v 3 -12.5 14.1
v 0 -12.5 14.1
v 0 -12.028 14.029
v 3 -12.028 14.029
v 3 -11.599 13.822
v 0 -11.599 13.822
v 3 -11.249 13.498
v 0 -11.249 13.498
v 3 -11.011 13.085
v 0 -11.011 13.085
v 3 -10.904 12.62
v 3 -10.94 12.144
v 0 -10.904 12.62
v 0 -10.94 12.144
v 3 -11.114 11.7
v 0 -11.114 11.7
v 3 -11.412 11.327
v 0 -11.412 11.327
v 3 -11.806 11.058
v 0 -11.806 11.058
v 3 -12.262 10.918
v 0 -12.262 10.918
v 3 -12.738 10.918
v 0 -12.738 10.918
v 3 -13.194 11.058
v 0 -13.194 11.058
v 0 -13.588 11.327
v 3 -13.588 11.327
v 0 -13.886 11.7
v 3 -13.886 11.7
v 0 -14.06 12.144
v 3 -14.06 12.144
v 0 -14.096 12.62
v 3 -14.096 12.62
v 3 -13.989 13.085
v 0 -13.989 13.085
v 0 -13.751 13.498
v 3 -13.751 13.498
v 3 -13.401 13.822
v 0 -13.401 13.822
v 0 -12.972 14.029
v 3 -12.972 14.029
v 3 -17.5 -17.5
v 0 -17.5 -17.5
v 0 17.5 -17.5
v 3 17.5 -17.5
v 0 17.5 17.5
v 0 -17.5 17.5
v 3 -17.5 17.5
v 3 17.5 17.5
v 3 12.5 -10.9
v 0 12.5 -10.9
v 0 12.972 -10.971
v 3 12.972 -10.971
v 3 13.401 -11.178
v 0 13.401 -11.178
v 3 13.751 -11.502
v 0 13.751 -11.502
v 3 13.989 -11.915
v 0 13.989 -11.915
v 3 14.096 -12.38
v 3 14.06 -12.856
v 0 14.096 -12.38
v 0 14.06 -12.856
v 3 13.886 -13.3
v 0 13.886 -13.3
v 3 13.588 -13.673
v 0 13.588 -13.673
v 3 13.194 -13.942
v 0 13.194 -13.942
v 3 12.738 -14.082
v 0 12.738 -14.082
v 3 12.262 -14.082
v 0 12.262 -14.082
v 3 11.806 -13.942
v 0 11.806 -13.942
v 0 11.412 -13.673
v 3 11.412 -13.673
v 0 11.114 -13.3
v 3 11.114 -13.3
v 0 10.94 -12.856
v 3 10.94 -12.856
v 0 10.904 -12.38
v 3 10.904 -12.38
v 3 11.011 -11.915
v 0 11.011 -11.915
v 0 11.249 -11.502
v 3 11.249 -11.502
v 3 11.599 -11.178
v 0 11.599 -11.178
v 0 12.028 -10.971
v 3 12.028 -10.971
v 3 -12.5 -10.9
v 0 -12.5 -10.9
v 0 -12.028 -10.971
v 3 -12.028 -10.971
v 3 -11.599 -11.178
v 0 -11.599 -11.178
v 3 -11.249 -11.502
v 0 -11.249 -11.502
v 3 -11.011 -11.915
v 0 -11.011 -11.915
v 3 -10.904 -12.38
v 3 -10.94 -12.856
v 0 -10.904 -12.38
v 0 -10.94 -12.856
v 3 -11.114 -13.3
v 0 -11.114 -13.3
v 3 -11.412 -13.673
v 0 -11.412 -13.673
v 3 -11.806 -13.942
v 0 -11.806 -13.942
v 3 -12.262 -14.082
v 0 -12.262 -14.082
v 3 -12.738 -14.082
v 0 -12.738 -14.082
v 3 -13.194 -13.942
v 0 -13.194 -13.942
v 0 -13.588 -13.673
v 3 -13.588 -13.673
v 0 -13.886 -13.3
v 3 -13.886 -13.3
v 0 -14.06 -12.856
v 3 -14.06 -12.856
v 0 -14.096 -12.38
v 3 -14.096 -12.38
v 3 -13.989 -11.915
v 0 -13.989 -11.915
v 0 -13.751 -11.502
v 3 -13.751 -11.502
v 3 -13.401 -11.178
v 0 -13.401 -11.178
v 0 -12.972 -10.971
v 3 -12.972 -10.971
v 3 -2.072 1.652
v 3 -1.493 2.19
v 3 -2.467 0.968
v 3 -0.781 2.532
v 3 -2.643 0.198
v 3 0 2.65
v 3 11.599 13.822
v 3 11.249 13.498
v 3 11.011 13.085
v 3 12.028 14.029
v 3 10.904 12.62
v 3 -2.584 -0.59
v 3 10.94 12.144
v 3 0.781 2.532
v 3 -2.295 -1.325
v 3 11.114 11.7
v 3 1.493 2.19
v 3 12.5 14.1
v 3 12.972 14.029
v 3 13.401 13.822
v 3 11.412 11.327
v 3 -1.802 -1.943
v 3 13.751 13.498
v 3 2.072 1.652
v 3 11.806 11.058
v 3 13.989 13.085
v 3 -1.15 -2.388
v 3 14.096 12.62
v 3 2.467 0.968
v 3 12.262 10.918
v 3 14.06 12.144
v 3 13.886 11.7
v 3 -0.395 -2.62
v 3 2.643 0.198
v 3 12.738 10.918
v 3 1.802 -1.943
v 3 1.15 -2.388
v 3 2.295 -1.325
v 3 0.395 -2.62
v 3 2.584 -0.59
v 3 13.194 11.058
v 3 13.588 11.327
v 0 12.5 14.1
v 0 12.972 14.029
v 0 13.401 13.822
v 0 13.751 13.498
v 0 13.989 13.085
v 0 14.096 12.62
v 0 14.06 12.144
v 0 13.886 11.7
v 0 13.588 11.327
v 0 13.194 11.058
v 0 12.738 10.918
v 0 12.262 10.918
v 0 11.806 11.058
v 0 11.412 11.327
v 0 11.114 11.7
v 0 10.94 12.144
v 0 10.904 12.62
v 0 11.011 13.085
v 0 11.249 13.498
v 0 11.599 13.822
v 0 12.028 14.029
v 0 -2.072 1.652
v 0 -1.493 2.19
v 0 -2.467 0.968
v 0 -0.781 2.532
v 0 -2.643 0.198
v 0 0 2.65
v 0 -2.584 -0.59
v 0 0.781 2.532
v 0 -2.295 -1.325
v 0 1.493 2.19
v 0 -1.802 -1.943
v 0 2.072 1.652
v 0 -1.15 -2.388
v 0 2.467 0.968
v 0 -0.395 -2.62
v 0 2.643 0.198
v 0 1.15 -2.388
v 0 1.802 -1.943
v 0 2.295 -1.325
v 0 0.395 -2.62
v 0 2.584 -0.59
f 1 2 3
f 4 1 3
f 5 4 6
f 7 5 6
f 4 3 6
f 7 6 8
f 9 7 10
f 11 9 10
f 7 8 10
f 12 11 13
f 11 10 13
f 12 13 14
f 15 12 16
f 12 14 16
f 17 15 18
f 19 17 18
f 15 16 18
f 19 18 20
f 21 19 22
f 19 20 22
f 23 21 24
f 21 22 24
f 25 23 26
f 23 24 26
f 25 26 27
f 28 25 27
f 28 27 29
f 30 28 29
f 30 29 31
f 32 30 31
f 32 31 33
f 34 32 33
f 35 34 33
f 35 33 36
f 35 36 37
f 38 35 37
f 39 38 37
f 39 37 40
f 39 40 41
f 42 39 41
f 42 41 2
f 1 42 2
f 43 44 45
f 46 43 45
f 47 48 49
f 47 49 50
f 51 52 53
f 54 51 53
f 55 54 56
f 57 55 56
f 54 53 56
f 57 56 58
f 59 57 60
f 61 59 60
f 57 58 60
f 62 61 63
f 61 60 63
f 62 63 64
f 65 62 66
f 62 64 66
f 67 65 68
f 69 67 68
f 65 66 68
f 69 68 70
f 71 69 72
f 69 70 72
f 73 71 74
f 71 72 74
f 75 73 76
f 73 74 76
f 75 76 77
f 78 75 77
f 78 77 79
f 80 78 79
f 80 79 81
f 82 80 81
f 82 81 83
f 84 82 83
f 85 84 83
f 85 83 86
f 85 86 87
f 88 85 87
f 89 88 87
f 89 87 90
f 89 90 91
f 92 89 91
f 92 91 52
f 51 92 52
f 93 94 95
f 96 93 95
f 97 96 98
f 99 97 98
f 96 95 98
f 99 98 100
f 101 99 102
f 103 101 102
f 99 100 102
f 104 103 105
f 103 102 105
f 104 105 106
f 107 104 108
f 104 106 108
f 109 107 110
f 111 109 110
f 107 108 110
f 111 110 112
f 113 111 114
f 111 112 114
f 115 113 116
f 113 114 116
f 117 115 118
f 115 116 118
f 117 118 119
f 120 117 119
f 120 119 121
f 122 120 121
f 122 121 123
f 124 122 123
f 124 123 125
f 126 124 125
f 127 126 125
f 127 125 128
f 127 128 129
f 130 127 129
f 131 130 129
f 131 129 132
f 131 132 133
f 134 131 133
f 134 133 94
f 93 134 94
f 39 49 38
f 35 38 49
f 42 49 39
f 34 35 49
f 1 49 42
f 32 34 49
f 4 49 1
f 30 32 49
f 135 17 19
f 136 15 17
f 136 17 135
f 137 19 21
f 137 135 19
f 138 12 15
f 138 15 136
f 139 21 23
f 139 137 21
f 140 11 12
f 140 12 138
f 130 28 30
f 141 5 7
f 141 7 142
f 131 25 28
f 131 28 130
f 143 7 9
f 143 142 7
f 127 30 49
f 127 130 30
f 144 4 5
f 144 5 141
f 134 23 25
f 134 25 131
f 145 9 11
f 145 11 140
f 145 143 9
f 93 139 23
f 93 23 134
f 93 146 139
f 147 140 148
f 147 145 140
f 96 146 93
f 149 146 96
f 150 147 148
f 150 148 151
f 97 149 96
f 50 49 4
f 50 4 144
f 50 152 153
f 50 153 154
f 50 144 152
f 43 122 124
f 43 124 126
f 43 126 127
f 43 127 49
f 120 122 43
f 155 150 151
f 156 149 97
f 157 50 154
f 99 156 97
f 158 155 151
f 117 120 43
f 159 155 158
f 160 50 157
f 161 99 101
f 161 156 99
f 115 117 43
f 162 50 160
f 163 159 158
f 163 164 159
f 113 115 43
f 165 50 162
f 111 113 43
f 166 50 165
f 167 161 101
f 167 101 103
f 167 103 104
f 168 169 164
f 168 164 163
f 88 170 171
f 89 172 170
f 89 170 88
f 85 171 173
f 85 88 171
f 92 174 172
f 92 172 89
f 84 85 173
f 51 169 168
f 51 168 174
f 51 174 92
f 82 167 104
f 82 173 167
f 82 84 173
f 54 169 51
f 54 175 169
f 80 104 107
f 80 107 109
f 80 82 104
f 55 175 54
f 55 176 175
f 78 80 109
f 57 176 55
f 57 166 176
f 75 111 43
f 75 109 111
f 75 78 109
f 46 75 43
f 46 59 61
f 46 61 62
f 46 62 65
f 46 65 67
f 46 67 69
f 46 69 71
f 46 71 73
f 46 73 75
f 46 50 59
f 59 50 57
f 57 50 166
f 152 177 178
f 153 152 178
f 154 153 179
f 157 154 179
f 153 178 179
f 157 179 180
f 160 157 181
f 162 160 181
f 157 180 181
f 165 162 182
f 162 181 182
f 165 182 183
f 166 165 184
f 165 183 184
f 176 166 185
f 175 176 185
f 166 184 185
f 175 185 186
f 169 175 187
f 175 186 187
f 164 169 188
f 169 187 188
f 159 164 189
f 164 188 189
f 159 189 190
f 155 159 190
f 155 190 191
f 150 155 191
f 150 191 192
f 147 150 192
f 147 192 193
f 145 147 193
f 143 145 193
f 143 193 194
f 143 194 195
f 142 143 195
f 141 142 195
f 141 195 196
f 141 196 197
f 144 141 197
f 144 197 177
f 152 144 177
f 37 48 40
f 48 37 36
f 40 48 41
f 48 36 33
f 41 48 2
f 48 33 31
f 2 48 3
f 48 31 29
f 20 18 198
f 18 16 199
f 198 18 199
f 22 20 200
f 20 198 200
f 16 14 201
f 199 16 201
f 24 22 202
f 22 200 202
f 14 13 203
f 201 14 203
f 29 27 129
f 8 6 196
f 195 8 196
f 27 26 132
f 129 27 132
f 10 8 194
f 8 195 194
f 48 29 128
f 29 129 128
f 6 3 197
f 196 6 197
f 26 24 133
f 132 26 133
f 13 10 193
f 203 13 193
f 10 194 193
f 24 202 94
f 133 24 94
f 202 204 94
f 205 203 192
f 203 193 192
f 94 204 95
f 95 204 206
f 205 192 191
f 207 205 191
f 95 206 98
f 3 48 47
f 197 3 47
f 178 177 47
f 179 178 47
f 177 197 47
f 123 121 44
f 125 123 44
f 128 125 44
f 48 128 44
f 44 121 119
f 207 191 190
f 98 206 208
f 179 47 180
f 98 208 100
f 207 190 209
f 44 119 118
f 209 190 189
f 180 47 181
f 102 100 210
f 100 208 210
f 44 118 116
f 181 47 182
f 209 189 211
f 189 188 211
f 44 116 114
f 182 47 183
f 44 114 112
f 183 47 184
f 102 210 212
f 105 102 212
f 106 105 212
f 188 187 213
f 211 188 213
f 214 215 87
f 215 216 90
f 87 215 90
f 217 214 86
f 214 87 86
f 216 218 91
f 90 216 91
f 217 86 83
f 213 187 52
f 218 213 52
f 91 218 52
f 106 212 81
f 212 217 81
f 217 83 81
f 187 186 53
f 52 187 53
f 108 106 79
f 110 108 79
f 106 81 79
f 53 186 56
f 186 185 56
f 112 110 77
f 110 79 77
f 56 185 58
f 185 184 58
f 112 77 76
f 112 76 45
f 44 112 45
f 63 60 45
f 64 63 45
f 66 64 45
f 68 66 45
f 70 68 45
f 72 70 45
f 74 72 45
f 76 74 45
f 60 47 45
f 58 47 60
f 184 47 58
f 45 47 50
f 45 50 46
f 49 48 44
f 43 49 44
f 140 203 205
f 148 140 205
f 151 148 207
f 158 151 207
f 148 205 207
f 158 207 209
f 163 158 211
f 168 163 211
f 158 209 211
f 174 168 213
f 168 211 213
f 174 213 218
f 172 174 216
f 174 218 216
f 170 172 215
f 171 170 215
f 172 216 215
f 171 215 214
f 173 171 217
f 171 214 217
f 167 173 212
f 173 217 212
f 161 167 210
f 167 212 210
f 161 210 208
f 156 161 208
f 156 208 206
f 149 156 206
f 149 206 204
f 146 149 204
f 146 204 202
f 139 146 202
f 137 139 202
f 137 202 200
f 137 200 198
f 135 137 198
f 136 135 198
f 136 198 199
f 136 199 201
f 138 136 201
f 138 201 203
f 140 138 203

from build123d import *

# Parameters (mm, degrees)
SKETCH1_W           = 35
SKETCH1_H           = 35
BOSS_EXTRUDE1_DEPTH = 3
SKETCH2_R           = 1.6
CUT_EXTRUDE1_DEPTH  = 25.929901725
SKETCH3_R           = 2.65
CUT_EXTRUDE2_DEPTH  = 25.929901725


with BuildPart() as part:
    # Sketch1 → Boss-Extrude1 (new body)
    with BuildSketch(Plane(origin=(0, 0, 0), x_dir=(0, 0, -1), z_dir=(1, 0, 0))):
        Rectangle(SKETCH1_W, SKETCH1_H)
    extrude(amount=BOSS_EXTRUDE1_DEPTH)

    # Sketch2 → Cut-Extrude1 (cut, through all)
    with BuildSketch(Plane.ZY):
        with Locations((-12.5, 12.5)):
            Circle(SKETCH2_R)
        with Locations((-12.5, -12.5)):
            Circle(SKETCH2_R)
        with Locations((12.5, -12.5)):
            Circle(SKETCH2_R)
        with Locations((12.5, 12.5)):
            Circle(SKETCH2_R)
    extrude(amount=-CUT_EXTRUDE1_DEPTH, mode=Mode.SUBTRACT)

    # Sketch3 → Cut-Extrude2 (cut, through all)
    with BuildSketch(Plane.ZY):
        Circle(SKETCH3_R)
    extrude(amount=-CUT_EXTRUDE2_DEPTH, mode=Mode.SUBTRACT)


solid = part.part
